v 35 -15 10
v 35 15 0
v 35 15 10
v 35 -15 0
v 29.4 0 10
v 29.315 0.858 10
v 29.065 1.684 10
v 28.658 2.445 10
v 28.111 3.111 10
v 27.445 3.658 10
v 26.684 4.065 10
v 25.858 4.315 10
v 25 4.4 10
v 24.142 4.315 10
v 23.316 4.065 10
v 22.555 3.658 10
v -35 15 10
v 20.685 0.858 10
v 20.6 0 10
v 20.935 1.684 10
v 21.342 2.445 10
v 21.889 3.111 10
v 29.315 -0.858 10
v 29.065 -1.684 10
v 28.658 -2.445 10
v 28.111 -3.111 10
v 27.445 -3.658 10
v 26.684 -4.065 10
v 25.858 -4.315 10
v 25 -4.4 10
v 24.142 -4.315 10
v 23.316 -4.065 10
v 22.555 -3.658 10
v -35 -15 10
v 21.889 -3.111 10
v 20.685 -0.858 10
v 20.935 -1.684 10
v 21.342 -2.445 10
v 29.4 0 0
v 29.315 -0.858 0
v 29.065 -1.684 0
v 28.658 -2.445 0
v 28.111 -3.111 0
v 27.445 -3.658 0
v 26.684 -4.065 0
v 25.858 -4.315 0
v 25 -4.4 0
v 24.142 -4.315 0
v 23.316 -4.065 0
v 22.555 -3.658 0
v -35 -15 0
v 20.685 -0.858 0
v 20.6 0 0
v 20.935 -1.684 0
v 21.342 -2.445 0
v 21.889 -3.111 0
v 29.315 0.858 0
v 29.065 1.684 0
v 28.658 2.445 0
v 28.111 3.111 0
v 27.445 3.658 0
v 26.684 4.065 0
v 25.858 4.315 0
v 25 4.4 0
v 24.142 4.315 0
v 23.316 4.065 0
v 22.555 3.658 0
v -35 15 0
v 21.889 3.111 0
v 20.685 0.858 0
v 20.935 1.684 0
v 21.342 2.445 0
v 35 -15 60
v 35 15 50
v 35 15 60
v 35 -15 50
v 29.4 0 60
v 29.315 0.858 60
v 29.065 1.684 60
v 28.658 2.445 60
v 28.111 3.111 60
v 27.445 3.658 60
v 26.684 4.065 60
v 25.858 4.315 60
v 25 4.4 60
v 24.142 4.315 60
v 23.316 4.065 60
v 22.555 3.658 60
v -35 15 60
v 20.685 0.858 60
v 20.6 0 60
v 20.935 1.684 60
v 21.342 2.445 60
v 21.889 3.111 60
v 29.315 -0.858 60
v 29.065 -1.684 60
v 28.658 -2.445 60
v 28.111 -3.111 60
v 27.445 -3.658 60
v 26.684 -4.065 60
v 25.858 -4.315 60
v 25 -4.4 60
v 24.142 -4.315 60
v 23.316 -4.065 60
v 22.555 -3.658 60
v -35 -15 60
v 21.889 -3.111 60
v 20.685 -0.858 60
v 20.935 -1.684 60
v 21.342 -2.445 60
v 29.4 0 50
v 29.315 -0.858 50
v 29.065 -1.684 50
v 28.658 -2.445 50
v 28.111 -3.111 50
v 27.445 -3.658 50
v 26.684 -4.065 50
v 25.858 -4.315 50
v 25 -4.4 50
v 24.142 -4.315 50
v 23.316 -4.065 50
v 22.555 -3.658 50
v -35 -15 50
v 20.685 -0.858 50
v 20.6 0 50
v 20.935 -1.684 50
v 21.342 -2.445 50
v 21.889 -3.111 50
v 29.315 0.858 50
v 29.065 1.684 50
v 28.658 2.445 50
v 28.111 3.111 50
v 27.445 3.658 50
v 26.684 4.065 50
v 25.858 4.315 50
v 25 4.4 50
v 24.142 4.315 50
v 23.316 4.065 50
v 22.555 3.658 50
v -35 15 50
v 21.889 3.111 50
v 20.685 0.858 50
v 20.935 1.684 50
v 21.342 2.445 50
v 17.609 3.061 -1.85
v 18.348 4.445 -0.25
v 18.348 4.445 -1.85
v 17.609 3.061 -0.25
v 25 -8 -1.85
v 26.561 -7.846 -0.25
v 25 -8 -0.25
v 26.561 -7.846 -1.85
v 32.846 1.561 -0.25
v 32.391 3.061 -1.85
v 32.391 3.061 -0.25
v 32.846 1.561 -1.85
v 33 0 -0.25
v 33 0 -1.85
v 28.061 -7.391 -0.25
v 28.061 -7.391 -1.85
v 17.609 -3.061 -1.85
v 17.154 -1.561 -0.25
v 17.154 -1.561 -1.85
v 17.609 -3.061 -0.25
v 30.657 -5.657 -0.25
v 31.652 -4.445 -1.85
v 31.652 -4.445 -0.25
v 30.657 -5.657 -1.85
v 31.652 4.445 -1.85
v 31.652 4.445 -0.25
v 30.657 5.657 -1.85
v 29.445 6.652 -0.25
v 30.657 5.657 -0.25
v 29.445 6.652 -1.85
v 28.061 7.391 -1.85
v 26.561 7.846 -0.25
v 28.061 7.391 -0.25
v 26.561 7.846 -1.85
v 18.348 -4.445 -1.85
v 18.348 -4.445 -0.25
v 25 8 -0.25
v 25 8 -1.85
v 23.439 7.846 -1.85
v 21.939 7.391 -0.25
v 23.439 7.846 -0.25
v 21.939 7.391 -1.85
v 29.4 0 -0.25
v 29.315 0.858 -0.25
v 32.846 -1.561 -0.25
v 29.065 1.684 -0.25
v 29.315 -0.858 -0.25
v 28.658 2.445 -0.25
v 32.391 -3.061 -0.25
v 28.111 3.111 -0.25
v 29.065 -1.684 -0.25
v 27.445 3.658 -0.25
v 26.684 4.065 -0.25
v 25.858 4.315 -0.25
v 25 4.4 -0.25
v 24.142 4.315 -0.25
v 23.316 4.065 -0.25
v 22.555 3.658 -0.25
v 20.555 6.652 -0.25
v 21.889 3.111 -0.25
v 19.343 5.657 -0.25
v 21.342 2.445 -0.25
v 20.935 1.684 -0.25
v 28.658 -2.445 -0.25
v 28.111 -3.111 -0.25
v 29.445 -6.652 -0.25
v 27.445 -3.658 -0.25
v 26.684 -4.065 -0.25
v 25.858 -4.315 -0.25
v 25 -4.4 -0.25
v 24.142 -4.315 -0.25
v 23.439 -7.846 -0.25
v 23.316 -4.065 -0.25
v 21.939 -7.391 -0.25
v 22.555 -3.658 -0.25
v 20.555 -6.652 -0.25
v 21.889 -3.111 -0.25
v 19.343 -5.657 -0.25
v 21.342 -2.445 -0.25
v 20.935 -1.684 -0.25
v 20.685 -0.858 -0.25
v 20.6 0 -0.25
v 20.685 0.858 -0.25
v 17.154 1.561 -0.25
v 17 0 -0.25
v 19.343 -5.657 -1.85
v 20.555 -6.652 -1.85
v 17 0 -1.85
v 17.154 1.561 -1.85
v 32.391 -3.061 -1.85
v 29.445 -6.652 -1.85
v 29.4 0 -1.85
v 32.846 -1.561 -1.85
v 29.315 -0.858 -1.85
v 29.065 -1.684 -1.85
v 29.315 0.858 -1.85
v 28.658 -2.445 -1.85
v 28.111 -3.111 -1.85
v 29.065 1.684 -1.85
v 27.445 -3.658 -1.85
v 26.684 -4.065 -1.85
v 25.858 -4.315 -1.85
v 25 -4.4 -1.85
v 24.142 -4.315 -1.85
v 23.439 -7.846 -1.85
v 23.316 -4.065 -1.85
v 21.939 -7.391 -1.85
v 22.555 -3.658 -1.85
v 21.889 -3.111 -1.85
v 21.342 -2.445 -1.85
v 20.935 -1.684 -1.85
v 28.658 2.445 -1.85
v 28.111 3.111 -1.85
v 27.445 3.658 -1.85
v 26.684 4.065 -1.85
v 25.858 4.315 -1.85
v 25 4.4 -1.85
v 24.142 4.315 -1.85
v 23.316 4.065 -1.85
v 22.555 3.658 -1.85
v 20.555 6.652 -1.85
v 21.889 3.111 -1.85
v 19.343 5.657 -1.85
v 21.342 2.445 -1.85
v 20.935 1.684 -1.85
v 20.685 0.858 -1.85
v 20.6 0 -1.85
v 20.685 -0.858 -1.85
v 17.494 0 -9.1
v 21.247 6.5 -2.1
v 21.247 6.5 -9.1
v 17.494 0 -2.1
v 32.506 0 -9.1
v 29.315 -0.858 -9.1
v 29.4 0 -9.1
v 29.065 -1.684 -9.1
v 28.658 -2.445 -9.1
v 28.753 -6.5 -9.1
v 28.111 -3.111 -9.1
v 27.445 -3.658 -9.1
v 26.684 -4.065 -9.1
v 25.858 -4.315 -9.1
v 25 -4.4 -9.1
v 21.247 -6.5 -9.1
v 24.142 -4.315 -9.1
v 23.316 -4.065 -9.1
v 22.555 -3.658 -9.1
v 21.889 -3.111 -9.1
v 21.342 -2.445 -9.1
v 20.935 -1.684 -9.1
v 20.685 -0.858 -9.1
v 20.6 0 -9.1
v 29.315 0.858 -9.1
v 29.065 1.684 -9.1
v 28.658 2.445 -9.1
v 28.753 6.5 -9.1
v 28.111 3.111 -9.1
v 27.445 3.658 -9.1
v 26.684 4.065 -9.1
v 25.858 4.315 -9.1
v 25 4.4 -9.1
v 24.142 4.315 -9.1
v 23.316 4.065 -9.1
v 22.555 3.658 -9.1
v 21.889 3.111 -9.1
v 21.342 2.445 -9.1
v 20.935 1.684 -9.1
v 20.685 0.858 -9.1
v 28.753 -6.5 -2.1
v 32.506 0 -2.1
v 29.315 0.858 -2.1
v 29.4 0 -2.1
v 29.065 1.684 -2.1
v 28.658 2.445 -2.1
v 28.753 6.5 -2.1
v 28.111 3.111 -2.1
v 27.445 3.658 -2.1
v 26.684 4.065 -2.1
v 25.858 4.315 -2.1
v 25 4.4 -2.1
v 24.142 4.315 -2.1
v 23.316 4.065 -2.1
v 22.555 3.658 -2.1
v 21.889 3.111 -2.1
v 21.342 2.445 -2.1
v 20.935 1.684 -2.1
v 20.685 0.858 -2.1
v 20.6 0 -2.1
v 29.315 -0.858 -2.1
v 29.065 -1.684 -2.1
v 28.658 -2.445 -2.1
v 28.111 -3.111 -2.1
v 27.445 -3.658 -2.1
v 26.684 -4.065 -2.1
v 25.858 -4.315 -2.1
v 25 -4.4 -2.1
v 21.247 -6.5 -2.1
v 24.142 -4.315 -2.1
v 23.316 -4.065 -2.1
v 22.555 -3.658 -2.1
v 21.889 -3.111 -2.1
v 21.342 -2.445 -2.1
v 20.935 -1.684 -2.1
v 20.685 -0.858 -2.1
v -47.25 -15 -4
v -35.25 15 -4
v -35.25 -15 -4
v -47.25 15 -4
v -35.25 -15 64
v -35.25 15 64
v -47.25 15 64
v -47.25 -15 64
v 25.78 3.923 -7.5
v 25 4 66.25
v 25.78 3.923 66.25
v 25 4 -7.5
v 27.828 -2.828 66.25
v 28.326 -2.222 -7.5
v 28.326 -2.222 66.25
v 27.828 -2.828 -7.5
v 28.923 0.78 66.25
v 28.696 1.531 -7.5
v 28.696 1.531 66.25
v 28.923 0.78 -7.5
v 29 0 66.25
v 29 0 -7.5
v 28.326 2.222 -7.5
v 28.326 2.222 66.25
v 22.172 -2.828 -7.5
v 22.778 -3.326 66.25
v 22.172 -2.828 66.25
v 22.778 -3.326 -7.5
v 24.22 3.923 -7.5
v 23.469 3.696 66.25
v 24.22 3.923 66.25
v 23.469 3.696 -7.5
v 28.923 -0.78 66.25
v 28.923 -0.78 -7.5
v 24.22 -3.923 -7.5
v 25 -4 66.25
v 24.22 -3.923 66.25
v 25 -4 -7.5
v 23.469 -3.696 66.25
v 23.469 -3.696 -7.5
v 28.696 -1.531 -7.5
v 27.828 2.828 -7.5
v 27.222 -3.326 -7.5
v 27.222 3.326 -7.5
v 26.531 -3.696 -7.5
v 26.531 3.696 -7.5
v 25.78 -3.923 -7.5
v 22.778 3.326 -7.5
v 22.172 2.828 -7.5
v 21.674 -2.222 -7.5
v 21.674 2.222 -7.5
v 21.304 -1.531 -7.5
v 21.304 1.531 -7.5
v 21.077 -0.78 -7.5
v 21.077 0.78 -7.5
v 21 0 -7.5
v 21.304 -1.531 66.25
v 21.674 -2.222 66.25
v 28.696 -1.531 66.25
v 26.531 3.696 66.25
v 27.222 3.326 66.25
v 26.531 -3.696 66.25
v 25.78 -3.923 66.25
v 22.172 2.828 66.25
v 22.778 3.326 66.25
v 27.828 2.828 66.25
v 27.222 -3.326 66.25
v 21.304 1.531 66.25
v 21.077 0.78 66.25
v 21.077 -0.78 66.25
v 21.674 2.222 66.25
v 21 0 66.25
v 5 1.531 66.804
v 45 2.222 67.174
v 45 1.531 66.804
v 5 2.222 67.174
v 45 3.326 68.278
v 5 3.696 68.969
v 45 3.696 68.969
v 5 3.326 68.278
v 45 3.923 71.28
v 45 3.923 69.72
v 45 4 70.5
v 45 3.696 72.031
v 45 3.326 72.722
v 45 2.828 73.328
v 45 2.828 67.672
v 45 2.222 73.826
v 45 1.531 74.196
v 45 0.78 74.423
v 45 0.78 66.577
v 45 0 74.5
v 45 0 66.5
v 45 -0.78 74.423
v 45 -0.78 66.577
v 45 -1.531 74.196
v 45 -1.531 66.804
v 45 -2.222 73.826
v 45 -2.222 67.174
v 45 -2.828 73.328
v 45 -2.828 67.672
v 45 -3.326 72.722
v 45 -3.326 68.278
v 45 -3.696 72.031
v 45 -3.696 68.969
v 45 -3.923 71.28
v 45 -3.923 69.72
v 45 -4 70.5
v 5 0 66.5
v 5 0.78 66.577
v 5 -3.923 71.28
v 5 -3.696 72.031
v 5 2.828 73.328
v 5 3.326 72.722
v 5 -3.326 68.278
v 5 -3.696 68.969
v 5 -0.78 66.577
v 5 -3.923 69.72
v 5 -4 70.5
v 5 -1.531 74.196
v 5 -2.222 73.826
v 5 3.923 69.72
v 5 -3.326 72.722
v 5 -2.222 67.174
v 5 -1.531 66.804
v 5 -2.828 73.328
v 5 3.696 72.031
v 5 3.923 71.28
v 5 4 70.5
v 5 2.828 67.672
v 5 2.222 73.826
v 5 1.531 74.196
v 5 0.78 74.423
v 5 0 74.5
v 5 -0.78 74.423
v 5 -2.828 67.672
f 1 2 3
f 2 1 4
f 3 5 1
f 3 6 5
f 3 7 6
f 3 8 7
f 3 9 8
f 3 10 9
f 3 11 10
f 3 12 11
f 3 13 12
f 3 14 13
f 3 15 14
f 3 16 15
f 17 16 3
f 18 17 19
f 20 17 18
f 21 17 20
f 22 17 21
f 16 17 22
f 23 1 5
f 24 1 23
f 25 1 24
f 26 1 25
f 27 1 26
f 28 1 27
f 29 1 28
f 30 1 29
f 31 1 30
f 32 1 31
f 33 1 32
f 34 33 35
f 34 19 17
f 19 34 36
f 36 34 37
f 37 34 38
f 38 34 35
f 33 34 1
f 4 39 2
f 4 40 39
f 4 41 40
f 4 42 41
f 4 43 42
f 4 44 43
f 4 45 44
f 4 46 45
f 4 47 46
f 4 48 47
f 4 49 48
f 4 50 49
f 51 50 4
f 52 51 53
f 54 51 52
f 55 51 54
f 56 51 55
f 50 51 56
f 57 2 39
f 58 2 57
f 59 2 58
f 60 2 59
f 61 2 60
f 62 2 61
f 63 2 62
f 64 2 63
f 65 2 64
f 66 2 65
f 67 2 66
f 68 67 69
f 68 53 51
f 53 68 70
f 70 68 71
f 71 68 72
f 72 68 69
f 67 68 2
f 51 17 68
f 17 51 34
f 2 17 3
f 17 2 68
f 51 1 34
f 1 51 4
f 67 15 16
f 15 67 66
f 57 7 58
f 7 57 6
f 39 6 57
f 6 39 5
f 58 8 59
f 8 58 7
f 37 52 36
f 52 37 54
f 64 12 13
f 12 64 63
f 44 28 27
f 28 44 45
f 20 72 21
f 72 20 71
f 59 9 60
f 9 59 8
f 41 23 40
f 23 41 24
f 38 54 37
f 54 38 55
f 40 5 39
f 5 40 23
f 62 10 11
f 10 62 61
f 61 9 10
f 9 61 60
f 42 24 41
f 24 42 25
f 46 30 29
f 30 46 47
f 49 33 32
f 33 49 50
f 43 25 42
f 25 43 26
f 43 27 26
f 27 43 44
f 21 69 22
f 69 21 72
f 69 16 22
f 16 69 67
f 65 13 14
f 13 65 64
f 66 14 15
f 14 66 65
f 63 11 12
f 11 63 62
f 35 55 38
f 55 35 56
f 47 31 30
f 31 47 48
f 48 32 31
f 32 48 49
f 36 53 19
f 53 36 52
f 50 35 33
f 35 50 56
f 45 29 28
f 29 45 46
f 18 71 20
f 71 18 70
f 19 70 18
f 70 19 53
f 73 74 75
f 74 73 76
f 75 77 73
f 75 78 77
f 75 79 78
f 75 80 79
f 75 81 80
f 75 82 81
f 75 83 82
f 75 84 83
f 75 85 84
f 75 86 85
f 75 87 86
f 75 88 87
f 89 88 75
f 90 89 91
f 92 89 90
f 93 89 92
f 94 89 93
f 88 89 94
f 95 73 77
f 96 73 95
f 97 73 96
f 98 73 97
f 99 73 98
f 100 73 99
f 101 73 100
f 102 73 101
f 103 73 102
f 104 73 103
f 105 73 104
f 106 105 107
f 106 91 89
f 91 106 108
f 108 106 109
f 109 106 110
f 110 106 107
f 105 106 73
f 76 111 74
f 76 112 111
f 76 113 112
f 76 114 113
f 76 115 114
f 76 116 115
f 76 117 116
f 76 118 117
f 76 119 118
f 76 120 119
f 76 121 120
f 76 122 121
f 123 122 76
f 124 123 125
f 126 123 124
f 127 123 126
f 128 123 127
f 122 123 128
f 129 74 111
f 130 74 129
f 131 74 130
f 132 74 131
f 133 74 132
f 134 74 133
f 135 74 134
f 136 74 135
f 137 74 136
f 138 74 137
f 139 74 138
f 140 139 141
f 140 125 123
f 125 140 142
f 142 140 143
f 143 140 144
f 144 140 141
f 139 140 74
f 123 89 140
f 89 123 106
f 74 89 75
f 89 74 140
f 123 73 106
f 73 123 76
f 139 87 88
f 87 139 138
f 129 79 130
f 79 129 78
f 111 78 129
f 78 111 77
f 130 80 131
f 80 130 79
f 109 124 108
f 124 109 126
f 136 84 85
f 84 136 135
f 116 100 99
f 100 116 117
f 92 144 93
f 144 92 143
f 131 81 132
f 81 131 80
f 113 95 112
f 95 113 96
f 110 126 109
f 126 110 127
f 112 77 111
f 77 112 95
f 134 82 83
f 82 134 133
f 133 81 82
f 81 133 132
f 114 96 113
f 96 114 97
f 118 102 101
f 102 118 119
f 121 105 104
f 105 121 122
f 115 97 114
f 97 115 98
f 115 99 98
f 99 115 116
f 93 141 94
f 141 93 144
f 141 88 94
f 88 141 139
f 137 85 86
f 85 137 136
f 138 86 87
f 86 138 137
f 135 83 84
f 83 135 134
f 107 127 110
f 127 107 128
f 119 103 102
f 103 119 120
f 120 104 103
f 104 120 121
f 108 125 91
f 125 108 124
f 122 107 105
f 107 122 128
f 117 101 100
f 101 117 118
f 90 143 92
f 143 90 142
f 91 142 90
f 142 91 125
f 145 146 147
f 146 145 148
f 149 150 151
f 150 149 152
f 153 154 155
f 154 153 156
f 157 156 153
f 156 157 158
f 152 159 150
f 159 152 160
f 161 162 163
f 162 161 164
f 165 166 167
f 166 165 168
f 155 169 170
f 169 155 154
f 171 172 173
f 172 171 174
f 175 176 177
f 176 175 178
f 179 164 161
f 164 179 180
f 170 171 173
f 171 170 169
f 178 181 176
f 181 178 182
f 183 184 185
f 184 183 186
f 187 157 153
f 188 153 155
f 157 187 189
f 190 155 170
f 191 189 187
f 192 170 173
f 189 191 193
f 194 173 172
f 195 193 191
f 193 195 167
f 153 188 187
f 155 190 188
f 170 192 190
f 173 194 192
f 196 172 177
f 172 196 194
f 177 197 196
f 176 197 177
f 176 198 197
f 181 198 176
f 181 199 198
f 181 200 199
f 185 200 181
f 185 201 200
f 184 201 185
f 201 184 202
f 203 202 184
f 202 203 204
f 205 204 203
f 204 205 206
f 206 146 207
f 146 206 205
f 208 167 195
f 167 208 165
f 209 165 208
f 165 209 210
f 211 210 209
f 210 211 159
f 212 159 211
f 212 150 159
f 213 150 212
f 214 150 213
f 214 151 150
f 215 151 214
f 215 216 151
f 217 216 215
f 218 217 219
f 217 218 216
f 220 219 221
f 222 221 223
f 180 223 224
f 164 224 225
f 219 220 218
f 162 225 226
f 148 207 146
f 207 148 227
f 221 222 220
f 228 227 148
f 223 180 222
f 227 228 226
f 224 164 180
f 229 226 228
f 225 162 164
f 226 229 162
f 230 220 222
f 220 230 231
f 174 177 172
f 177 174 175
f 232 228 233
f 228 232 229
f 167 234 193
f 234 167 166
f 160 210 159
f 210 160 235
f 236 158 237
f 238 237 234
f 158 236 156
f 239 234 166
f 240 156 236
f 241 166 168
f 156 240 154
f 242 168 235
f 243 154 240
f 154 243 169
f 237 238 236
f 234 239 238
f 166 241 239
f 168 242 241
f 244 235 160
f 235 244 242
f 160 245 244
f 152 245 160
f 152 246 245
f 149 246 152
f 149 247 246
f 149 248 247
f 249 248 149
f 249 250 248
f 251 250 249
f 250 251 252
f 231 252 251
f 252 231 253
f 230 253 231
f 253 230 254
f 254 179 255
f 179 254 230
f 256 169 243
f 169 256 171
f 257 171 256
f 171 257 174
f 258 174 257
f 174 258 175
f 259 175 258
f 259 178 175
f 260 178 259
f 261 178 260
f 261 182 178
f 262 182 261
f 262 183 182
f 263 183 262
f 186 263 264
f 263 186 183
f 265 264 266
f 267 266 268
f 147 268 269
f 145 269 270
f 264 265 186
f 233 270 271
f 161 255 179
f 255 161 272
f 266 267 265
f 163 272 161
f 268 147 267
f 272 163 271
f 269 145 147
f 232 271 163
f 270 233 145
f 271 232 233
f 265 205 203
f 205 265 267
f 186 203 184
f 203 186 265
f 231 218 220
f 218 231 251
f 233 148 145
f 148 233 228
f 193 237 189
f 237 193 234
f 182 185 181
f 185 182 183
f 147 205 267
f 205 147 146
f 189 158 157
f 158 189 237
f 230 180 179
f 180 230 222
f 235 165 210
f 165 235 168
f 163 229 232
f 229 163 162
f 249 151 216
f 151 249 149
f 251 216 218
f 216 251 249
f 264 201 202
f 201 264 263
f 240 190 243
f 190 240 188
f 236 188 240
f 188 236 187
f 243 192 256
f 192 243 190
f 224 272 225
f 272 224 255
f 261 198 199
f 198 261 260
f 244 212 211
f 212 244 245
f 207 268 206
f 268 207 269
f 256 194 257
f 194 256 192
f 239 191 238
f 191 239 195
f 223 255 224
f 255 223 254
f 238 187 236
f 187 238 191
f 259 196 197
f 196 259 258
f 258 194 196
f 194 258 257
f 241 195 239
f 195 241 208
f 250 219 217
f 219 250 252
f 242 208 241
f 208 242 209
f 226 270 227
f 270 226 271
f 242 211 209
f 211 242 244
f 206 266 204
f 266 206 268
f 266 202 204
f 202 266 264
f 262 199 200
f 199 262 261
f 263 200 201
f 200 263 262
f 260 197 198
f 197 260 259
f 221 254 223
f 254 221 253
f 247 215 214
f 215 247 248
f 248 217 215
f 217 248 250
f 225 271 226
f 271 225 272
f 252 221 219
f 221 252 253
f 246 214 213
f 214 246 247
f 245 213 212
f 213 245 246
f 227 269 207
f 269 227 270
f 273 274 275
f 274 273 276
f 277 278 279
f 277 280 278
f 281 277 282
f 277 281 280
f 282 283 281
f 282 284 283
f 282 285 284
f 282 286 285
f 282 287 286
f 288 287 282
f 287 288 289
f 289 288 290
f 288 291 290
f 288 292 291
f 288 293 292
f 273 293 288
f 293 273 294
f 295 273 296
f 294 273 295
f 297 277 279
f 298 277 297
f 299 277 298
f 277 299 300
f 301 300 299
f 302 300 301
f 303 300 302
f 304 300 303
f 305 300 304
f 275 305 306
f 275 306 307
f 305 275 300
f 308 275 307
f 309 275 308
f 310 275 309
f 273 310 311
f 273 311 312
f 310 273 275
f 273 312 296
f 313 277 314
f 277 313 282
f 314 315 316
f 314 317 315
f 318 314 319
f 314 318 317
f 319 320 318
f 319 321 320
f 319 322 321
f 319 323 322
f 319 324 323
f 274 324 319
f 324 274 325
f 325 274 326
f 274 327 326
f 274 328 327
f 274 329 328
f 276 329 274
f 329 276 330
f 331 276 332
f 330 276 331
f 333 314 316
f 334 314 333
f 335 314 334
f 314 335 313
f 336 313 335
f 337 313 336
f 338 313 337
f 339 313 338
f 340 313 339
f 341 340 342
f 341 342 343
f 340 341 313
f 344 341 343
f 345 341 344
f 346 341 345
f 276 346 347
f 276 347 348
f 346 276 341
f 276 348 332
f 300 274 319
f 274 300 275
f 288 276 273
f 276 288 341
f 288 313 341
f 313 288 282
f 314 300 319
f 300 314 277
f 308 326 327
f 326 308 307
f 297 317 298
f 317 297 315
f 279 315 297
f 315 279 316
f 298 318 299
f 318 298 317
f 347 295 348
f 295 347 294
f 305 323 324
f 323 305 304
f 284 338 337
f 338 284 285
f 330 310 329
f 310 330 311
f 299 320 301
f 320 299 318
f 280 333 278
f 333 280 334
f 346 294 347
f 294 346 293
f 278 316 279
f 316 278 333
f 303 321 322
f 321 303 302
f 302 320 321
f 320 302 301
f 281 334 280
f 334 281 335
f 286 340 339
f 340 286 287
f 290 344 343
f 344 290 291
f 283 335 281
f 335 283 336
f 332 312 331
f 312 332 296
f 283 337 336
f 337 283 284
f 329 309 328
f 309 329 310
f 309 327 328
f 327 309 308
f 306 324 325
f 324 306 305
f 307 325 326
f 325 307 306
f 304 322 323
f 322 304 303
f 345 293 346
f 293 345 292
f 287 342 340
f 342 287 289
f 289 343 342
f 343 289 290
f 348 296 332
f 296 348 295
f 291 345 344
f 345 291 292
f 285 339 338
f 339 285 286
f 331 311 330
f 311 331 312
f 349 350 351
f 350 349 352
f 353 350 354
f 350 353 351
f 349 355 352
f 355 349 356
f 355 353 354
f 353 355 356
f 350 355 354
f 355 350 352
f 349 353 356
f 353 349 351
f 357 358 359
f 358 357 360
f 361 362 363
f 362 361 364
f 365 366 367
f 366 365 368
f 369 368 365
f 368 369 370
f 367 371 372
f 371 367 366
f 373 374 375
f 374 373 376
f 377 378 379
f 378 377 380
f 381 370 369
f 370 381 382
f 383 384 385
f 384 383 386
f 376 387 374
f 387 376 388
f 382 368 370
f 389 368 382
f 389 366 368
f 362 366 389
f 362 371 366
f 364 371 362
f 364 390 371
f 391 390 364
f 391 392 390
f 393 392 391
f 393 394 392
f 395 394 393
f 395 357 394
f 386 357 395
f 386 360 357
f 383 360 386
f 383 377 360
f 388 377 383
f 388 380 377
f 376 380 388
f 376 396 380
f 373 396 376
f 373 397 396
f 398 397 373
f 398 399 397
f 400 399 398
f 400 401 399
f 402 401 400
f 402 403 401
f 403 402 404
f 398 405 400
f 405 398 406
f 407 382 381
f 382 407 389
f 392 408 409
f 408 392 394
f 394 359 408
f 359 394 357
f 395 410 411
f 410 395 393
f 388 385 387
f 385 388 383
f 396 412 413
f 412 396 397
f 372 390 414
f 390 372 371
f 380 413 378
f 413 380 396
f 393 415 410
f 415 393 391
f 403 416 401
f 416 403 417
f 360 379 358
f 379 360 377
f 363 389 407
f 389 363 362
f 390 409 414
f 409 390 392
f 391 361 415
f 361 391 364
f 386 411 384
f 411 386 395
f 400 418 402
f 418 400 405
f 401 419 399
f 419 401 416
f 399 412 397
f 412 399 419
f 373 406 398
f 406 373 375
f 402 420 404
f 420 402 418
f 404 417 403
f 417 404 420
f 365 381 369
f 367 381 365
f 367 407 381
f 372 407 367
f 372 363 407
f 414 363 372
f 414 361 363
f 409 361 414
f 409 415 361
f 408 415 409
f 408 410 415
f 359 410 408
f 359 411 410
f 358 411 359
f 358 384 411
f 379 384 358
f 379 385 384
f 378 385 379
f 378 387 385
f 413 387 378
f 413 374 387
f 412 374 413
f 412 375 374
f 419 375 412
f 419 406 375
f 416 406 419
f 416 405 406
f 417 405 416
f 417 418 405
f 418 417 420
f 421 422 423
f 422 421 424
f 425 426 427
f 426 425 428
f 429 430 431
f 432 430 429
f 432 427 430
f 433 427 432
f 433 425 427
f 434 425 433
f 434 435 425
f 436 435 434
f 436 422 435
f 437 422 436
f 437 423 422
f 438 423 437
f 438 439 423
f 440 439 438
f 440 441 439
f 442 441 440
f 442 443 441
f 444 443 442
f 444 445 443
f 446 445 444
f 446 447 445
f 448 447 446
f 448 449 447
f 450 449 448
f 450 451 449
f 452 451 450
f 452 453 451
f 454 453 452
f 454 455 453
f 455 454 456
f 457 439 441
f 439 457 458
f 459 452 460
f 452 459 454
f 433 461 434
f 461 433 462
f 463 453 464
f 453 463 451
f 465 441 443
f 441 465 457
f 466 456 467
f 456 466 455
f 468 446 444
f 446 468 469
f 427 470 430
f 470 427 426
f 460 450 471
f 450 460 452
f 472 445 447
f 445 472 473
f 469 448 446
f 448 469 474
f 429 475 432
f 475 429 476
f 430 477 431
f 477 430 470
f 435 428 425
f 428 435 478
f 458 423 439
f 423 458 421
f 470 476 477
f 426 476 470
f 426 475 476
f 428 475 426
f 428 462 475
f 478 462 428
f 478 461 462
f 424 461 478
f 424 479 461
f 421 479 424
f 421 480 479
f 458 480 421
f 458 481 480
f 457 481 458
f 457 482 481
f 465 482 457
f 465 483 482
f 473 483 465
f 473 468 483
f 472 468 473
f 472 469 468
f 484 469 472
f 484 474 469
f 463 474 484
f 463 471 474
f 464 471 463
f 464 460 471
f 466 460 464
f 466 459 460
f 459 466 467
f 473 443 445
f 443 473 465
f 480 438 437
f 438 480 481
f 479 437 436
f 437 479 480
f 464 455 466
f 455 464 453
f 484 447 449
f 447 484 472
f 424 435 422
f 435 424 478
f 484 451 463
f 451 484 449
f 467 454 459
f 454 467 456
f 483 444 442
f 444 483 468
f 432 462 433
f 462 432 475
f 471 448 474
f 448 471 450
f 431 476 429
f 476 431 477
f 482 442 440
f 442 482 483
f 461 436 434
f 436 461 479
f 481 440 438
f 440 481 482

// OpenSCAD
$fn = 32;

// ------------------------------------------------------------------------
// C clamp: throat 50 mm, screw d8
// Every part is its own module, assembly() places every instance.
// ------------------------------------------------------------------------

// --- part 1 ---
module clamp_arm() {
  difference() {
    translate([-35, -15, 0]) cube([70, 30, 10]);
    translate([25, 0, -1]) cylinder(h = 12, d = 8.8);
  }
}

// --- part 2 ---
module clamp_spine() {
  difference() {
    translate([-34, -15, 0]) cube([68, 30, 12]);
  }
}

// --- part 3 ---
module clamp_screw() {
  translate([0, 0, -36.875]) cylinder(h = 73.75, d = 8);
}

// --- part 4 ---
module clamp_washer() {
  difference() {
      translate([0, 0, 0]) cylinder(h = 1.6, d = 16);
      translate([0, 0, -1]) cylinder(h = 3.6, d = 8.8);
    }
}

// --- part 5 ---
module clamp_nut() {
  difference() {
    linear_extrude(height = 7) polygon(points = [[7.506, 0], [3.753, 6.5], [-3.753, 6.5], [-7.506, 0], [-3.753, -6.5], [3.753, -6.5]]);
    translate([0, 0, -1]) cylinder(h = 9, d = 8.8);
  }
}

// --- part 6 ---
module tommy_bar() {
  translate([0, 0, -20]) cylinder(h = 40, d = 8);
}

// --- assembly ---
module assembly() {
  color([0.80, 0.24, 0.20]) translate([0, 0, 0]) rotate([0, 0, 0]) clamp_arm();
  color([0.20, 0.45, 0.75]) translate([0, 0, 50]) rotate([0, 0, 0]) clamp_arm();
  color([0.25, 0.62, 0.32]) translate([-47.25, 0, 30]) rotate([0, 90, 0]) clamp_spine();
  color([0.92, 0.70, 0.18]) translate([25, 0, 29.375]) rotate([0, 0, 0]) clamp_screw();
  color([0.58, 0.35, 0.70]) translate([25, 0, -1.85]) rotate([0, 0, 0]) clamp_washer();
  color([0.16, 0.66, 0.66]) translate([25, 0, -9.1]) rotate([0, 0, 0]) clamp_nut();
  color([0.85, 0.48, 0.18]) translate([25, 0, 70.5]) rotate([0, 90, 0]) tommy_bar();
}

assembly();
